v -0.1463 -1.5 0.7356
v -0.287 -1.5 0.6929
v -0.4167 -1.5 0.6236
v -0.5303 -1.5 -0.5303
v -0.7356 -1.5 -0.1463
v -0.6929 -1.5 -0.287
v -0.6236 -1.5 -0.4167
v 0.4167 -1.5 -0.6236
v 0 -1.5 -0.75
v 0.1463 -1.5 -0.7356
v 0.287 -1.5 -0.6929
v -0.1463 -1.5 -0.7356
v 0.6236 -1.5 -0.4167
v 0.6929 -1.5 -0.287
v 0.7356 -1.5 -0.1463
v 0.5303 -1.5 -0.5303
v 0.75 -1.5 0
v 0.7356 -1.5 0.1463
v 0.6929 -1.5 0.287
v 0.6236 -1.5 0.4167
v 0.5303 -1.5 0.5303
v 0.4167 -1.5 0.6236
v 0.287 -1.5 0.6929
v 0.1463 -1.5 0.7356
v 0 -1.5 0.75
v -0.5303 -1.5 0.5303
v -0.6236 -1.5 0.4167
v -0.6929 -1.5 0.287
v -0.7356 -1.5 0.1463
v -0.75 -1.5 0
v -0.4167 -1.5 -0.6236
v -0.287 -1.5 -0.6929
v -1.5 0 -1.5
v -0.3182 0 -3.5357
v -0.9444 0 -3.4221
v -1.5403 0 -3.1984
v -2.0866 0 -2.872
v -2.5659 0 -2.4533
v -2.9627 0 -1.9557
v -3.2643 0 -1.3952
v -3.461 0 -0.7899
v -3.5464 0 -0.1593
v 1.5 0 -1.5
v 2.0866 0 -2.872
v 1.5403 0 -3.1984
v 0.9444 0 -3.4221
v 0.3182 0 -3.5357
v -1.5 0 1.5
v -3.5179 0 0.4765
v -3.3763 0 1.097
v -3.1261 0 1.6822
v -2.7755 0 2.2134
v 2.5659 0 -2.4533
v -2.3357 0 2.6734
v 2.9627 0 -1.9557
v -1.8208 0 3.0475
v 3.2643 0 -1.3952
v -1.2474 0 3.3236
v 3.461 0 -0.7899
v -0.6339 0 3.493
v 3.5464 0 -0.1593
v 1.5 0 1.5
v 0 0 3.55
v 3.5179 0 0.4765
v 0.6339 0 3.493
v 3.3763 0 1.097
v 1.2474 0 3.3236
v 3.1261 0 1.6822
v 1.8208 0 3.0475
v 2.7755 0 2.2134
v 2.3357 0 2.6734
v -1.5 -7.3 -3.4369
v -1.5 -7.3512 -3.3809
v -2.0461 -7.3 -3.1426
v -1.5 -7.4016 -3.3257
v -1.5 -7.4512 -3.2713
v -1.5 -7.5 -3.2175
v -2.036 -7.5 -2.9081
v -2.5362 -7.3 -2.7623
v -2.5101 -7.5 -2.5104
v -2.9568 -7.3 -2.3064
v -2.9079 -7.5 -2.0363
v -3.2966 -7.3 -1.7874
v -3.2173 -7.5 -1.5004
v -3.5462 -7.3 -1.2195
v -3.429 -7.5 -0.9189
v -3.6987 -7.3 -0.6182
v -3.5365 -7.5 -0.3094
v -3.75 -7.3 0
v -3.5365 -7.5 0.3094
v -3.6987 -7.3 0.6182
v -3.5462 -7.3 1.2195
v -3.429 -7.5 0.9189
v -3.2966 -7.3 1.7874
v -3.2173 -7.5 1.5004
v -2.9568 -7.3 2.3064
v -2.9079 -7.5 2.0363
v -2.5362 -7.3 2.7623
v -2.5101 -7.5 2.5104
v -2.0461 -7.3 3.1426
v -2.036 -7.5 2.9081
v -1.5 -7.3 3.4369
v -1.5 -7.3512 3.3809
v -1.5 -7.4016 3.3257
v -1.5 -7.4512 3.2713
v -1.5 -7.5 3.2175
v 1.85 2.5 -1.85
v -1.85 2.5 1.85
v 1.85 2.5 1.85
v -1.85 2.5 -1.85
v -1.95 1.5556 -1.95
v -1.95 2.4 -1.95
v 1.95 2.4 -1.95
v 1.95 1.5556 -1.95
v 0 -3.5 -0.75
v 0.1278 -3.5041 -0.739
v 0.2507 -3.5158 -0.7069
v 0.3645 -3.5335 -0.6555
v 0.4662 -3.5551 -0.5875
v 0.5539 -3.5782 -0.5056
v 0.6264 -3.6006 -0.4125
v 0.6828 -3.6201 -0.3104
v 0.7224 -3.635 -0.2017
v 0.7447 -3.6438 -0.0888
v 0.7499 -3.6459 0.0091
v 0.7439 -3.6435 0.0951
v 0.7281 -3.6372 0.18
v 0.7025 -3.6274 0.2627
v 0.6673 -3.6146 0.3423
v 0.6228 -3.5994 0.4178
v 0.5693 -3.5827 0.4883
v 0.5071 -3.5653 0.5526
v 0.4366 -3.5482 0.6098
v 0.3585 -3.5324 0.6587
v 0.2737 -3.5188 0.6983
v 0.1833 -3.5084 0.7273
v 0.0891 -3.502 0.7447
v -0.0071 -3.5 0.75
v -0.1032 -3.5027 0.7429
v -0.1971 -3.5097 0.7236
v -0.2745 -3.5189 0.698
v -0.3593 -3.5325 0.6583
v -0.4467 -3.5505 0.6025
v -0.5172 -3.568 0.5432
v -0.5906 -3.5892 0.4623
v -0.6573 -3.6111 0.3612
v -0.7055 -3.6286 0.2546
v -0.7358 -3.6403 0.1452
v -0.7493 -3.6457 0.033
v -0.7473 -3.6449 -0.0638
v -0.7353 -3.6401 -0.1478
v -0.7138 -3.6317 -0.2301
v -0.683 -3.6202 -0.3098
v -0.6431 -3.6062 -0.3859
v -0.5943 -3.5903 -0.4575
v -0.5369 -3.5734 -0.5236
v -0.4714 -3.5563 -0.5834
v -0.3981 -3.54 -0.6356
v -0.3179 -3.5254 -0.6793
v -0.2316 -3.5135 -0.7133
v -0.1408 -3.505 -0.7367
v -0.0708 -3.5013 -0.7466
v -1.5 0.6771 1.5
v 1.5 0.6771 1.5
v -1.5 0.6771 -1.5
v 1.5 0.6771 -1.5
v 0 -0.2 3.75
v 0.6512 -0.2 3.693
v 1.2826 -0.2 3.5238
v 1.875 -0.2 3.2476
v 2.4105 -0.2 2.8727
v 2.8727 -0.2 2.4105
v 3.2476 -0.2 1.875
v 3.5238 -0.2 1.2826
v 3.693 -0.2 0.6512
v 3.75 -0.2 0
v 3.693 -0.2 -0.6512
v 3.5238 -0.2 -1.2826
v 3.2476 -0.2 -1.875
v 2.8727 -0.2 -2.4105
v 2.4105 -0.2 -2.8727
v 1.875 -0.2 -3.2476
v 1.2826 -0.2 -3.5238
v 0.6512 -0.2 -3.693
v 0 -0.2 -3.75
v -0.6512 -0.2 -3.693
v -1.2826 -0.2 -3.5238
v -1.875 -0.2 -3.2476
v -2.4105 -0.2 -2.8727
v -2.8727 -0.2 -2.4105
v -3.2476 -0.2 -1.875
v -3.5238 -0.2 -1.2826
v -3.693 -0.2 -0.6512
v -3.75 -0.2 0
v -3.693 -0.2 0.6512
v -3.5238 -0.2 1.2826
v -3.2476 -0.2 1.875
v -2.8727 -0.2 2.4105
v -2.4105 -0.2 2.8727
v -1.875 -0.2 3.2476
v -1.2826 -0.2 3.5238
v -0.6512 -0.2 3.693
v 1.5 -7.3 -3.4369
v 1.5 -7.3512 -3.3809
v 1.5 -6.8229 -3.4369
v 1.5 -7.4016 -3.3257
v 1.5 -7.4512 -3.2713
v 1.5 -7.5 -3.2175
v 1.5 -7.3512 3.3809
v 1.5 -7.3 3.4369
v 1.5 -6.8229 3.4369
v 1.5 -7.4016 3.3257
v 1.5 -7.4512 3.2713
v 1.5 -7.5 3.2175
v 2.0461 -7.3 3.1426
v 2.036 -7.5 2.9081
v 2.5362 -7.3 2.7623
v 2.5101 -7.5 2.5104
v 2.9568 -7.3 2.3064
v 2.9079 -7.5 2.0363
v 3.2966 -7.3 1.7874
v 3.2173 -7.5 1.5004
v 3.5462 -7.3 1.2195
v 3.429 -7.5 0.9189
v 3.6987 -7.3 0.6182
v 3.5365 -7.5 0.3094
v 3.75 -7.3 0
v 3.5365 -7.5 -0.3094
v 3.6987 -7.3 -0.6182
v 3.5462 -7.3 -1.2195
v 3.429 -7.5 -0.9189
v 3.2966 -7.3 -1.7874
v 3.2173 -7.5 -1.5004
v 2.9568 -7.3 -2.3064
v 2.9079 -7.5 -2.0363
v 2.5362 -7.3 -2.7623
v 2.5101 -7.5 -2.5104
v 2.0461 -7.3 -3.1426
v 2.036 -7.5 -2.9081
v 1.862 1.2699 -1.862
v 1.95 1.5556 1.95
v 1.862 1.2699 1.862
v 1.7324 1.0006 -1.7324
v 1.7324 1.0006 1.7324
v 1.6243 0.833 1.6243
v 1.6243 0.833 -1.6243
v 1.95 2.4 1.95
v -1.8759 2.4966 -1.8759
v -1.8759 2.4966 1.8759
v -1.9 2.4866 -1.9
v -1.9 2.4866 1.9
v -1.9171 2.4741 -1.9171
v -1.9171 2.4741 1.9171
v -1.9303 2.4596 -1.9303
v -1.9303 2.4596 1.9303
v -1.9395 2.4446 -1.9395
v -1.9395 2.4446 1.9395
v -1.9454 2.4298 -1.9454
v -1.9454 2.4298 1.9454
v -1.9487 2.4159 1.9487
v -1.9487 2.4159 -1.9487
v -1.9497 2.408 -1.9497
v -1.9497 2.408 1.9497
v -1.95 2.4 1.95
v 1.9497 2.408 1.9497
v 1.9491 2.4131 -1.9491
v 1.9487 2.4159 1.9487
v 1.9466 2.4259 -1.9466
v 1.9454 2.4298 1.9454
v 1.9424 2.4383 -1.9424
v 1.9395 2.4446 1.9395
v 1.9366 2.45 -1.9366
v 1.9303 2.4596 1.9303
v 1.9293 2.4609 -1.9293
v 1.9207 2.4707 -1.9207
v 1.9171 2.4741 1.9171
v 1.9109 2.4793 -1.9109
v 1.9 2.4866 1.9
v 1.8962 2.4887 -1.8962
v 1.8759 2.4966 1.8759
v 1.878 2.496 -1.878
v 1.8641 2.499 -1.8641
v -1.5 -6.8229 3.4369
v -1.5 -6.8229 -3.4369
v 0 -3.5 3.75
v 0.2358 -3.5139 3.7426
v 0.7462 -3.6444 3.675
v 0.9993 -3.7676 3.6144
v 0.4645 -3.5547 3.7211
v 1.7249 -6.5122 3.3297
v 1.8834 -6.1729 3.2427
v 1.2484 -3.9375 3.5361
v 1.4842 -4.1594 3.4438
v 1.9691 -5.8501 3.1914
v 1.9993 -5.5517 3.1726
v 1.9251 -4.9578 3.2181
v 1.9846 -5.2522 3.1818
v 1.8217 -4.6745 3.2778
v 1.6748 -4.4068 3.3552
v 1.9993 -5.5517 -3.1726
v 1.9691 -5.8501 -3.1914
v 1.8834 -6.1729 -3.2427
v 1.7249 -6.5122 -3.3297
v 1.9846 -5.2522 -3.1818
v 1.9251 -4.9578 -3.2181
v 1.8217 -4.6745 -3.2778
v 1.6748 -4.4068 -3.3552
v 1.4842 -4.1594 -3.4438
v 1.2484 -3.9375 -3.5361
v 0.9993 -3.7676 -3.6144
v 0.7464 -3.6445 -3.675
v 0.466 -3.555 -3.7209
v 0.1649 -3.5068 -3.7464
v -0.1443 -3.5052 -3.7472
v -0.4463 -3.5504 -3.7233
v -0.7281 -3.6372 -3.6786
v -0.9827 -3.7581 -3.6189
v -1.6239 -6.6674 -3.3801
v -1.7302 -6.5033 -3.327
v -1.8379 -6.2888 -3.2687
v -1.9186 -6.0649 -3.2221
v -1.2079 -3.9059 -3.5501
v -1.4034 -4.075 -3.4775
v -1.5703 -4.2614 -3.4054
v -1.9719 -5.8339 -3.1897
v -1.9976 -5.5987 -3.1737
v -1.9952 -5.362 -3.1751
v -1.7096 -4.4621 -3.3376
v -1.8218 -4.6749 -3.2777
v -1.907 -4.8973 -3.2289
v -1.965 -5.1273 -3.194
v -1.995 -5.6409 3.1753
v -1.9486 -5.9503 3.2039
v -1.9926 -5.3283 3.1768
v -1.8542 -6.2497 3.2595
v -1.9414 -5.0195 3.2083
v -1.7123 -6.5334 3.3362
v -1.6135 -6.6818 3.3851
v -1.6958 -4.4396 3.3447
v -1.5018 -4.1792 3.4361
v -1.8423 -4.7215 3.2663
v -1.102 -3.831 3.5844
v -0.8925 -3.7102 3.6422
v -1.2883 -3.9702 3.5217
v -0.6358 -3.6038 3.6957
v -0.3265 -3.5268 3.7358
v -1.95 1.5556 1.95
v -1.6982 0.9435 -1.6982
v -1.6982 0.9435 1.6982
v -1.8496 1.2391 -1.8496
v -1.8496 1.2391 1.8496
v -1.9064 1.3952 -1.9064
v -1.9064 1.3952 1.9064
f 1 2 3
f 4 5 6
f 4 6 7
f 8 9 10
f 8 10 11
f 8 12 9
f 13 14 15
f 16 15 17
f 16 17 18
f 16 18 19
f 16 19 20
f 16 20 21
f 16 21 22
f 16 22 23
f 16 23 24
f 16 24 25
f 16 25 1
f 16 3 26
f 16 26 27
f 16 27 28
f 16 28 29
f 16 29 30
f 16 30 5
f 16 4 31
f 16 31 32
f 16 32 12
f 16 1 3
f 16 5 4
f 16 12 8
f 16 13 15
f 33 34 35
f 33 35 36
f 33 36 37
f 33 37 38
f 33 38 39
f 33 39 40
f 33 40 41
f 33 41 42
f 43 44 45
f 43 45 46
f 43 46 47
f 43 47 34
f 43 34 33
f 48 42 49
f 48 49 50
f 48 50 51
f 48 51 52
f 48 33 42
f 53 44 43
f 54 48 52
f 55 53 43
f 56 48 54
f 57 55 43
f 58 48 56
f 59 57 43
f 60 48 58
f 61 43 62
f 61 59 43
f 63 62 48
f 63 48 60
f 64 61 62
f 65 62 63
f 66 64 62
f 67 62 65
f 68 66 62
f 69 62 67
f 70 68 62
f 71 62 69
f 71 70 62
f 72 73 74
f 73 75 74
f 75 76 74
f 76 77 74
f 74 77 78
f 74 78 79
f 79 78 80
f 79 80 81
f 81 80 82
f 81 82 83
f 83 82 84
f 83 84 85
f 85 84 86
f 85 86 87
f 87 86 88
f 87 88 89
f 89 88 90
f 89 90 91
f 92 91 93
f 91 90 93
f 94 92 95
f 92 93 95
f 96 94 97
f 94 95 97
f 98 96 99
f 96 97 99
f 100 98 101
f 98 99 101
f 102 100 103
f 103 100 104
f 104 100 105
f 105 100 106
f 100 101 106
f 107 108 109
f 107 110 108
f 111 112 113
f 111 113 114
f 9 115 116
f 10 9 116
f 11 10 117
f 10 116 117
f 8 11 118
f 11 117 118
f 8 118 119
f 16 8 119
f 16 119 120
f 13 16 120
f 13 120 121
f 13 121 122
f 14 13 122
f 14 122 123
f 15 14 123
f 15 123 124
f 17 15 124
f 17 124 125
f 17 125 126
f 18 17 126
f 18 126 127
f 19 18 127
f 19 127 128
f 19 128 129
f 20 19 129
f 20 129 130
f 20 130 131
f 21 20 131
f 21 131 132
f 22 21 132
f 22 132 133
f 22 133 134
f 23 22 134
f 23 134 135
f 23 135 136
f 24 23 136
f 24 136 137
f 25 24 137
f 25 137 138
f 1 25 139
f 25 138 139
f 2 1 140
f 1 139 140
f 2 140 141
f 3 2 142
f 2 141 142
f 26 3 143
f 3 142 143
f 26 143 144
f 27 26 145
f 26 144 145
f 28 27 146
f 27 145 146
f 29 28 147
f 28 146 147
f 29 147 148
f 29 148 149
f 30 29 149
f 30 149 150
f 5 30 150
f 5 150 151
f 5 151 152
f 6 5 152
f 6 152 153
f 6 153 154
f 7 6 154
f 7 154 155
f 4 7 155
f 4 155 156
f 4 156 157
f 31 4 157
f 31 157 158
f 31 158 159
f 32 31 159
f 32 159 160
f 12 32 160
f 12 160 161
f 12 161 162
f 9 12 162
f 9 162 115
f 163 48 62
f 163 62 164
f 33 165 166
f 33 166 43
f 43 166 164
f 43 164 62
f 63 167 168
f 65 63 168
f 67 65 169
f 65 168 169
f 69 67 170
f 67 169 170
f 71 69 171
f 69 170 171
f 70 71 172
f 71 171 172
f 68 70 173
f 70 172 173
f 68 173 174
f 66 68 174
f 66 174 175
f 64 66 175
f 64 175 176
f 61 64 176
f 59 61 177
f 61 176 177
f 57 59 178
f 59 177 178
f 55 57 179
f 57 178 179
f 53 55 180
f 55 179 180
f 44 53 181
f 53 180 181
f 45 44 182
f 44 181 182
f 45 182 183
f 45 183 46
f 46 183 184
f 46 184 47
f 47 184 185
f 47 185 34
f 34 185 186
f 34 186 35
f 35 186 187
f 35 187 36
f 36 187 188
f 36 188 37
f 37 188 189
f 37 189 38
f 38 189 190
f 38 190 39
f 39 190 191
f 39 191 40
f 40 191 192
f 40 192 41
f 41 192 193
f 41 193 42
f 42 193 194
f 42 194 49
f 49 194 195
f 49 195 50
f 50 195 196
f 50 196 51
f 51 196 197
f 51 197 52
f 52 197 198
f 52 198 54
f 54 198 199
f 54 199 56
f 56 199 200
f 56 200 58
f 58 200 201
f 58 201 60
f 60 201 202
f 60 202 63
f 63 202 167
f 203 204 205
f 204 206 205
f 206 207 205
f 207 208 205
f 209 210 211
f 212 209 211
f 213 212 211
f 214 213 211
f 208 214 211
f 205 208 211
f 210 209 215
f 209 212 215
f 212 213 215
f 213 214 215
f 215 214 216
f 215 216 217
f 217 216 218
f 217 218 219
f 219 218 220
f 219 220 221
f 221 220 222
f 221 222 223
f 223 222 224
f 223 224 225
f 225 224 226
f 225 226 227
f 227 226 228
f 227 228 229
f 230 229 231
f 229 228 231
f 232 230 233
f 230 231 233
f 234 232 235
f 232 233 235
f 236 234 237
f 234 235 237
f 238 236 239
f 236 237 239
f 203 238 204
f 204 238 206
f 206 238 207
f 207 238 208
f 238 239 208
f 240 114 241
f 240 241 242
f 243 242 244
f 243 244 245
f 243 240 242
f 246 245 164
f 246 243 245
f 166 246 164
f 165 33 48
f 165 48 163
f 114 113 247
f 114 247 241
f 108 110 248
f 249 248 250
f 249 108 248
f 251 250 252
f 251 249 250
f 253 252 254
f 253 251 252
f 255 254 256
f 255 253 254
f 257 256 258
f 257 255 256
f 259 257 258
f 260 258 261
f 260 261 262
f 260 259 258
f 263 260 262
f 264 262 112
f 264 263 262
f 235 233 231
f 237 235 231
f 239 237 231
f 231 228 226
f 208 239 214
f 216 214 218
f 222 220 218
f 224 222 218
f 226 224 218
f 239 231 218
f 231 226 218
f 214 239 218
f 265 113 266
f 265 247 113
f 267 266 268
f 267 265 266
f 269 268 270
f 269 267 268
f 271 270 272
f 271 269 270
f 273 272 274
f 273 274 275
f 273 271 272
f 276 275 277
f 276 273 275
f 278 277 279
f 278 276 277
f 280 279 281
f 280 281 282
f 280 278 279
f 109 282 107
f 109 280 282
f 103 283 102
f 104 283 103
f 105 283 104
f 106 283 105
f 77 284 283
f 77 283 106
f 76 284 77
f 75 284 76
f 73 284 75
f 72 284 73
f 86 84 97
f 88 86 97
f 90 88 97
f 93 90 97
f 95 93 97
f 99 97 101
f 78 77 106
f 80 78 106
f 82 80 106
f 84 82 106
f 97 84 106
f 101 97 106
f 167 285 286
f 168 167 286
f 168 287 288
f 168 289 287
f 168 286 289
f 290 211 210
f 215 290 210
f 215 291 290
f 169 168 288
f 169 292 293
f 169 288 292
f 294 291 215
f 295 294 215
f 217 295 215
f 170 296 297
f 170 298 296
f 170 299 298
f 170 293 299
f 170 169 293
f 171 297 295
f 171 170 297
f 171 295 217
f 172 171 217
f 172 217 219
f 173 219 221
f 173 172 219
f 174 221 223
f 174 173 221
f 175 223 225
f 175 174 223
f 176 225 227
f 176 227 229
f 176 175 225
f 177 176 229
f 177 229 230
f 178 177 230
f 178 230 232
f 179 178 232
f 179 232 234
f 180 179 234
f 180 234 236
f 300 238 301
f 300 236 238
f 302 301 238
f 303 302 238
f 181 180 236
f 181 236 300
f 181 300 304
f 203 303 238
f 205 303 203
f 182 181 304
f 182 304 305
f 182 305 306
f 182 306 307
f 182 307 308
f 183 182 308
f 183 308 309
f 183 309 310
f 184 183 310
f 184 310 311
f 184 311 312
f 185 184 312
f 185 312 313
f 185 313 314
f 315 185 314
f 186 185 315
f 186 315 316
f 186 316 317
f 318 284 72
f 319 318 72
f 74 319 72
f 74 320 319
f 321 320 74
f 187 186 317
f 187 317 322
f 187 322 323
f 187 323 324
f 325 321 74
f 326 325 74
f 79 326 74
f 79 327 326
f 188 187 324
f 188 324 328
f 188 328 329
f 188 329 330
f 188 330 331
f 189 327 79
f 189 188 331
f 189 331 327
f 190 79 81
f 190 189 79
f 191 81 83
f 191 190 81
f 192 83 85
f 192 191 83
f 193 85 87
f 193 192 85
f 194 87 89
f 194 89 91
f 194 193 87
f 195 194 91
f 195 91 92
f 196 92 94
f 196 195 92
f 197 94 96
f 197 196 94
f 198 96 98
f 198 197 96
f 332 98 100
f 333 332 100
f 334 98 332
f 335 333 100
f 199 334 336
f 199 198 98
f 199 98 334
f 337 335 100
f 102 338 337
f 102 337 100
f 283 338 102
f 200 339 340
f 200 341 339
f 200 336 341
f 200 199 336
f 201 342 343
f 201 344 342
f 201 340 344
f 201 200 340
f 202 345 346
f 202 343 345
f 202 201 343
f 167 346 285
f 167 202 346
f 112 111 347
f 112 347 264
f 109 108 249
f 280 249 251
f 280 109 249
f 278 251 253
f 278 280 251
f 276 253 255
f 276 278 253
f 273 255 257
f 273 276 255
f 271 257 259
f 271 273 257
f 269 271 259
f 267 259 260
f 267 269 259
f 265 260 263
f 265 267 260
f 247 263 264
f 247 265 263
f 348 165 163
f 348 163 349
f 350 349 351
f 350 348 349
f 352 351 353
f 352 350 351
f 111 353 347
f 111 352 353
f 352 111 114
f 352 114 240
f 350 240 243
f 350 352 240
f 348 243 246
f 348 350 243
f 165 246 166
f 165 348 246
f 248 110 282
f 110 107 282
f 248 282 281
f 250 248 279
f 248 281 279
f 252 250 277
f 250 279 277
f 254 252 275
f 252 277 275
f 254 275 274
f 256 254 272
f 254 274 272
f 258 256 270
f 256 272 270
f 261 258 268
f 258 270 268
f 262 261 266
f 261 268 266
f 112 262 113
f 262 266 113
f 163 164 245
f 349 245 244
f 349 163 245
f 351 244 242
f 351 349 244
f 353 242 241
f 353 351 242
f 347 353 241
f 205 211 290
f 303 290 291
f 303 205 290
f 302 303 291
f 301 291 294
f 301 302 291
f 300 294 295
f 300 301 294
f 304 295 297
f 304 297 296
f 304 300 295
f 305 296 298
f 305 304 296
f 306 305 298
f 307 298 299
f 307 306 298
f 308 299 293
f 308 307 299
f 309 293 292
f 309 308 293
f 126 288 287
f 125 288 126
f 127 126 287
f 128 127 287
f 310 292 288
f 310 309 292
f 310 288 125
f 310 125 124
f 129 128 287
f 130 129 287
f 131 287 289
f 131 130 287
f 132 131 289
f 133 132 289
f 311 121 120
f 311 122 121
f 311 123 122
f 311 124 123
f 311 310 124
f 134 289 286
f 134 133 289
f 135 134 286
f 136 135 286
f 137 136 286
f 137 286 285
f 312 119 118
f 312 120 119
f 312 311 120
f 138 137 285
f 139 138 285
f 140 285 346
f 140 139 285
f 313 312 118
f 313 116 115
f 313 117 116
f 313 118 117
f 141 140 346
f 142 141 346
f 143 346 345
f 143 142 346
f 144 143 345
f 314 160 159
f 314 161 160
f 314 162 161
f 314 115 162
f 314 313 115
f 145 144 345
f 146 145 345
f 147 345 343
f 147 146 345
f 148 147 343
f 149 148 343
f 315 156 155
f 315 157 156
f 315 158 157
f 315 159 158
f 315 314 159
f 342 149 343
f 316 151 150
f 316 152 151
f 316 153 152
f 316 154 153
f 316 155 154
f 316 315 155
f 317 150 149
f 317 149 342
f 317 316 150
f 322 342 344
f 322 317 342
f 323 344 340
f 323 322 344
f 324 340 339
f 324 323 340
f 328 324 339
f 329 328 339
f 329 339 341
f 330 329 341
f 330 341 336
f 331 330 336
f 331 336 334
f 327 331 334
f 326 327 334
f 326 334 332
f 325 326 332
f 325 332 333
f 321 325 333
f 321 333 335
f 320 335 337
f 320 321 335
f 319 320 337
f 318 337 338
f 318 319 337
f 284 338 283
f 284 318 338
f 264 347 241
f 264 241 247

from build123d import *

# Parameters (mm, degrees)
SKETCH_1_R                           = 3.75
EXTRUDE_1_DEPTH                      = 7.5
EXTRUDE_2_DEPTH                      = 2
EXTRUDE_2_DEPTH_BACK                 = 2
CUT_EXTRUDE_1_DEPTH                  = 2
CUT_EXTRUDE_1_DEPTH_BACK             = 2
CUT_EXTRUDE_2_REACH                  = 11.186
CUT_EXTRUDE_2_END_RADIUS             = 3.75
CUT_EXTRUDE_2_DIRECTION_2_REACH      = 11.186
CUT_EXTRUDE_2_DIRECTION_2_END_RADIUS = 3.75
FILLET_1_R                           = 0.1
SKETCH_5_R                           = 0.75
CUT_EXTRUDE_3_DEPTH                  = 6
CHAMFER_1_SIZE                       = 0.2


with BuildPart() as part:
    # 草图1 → 凸台-拉伸1 (new body)
    with BuildSketch(Plane(origin=(0, 0, 0), x_dir=(1, 0, 0), z_dir=(0, 1, 0))):
        with Locations(Location((0, 0, 0), (0, 0, 270))):
            Circle(SKETCH_1_R)
    extrude(amount=-EXTRUDE_1_DEPTH)

    # 草图2 → 凸台-拉伸2 (add, two sides: drawn at the far end of the back side and taken through both)
    with BuildSketch(Plane.XY.offset(-EXTRUDE_2_DEPTH_BACK)):
        with BuildLine():
            Line((-1.95, 2.5), (1.95, 2.5))
            Line((1.95, 2.5), (1.95, 1.555590279))
            ThreePointArc((1.95, 1.555590279), (1.780042303, 1.088161527), (1.5, 0.677124344))
            Line((1.5, 0.677124344), (1.5, 0))
            Line((1.5, 0), (-1.5, 0))
            Line((-1.5, 0), (-1.5, 0.677124344))
            ThreePointArc((-1.5, 0.677124344), (-1.780042303, 1.088161527), (-1.95, 1.555590279))
            Line((-1.95, 1.555590279), (-1.95, 2.5))
        make_face()
    extrude(amount=EXTRUDE_2_DEPTH + EXTRUDE_2_DEPTH_BACK)

    # 草图3 → 切除-拉伸1 (cut, two sides: drawn at the far end of the back side and taken through both)
    with BuildSketch(Plane(origin=(0, 0, 0), x_dir=(0, 0, -1), z_dir=(1, 0, 0)).offset(-CUT_EXTRUDE_1_DEPTH_BACK)):
        with BuildLine():
            Line((1.95, 2.5), (1.95, 1.555590279))
            ThreePointArc((1.95, 1.555590279), (1.780042303, 1.088161527), (1.5, 0.677124344))
            Line((1.5, 0.677124344), (1.5, 0))
            Line((1.5, 0), (2, 0))
            Line((2, 0), (2, 2.5))
            Line((2, 2.5), (1.95, 2.5))
        make_face()
        with BuildLine():
            Line((-2, 0), (-1.5, 0))
            Line((-1.5, 0), (-1.5, 0.677124344))
            ThreePointArc((-1.5, 0.677124344), (-1.780042303, 1.088161527), (-1.95, 1.555590279))
            Line((-1.95, 1.555590279), (-1.95, 2.5))
            Line((-1.95, 2.5), (-2, 2.5))
            Line((-2, 2.5), (-2, 0))
        make_face()
    extrude(amount=CUT_EXTRUDE_1_DEPTH + CUT_EXTRUDE_1_DEPTH_BACK, mode=Mode.SUBTRACT)

    # 切除-拉伸2: up to this cylinder (the profile starts inside it)
    cut_extrude_2_end = Plane(origin=(0, -5.585293, 0), z_dir=(0, 1, 0)) * Cylinder(CUT_EXTRUDE_2_END_RADIUS, 30.872, mode=Mode.PRIVATE)
    # 草图4 → 切除-拉伸2 (cut, up to the surface)
    with BuildSketch(Plane.XY, mode=Mode.PRIVATE) as cut_extrude_2_sk1:
        with BuildLine():
            Line((-1.5, -7.5), (1.5, -7.5))
            Line((1.5, -7.5), (1.5, -6.822875656))
            ThreePointArc((1.5, -6.822875656), (0, -3.5), (-1.5, -6.822875656))
            Line((-1.5, -6.822875656), (-1.5, -7.5))
        make_face()
    cut_extrude_2_tool1 = extrude(cut_extrude_2_sk1.sketch, amount=-CUT_EXTRUDE_2_REACH, mode=Mode.PRIVATE) & cut_extrude_2_end
    add(cut_extrude_2_tool1.solids().sort_by_distance((0, -5.585293, 0))[0], mode=Mode.SUBTRACT)

    # 切除-拉伸2 direction 2: up to this cylinder (the profile starts inside it)
    cut_extrude_2_direction_2_end = Plane(origin=(0, -5.585293, 0), z_dir=(0, 1, 0)) * Cylinder(CUT_EXTRUDE_2_DIRECTION_2_END_RADIUS, 30.872, mode=Mode.PRIVATE)
    # 草图4 → 切除-拉伸2 direction 2 (cut, up to the surface)
    with BuildSketch(Plane.XY, mode=Mode.PRIVATE) as cut_extrude_2_direction_2_sk1:
        with BuildLine():
            Line((-1.5, -7.5), (1.5, -7.5))
            Line((1.5, -7.5), (1.5, -6.822875656))
            ThreePointArc((1.5, -6.822875656), (0, -3.5), (-1.5, -6.822875656))
            Line((-1.5, -6.822875656), (-1.5, -7.5))
        make_face()
    cut_extrude_2_direction_2_tool1 = extrude(cut_extrude_2_direction_2_sk1.sketch, amount=CUT_EXTRUDE_2_DIRECTION_2_REACH, mode=Mode.PRIVATE) & cut_extrude_2_direction_2_end
    add(cut_extrude_2_direction_2_tool1.solids().sort_by_distance((0, -5.585293, 0))[0], mode=Mode.SUBTRACT)

    # 圆角1
    fillet_1_edges = [part.edges().sort_by_distance(p)[0] for p in [
        (0, 2.5, 1.95),
        (1.95, 2.5, 0),
        (-1.95, 2.5, 0),
        (0, 2.5, -1.95),
    ]]
    fillet(fillet_1_edges, radius=FILLET_1_R)

    # 草图5 → 切除-拉伸3 (cut)
    with BuildSketch(Plane.XZ.offset(7.5)):
        with Locations(Location((0, 0, 0), (0, 0, 270))):
            Circle(SKETCH_5_R)
    extrude(amount=-CUT_EXTRUDE_3_DEPTH, mode=Mode.SUBTRACT)

    # 倒角1
    chamfer_1_edges = [part.edges().sort_by_distance(p)[0] for p in [
        (0, 0, -3.75),
        (3.75, -7.5, 0),
        (-3.75, -7.5, 0),
    ]]
    chamfer(chamfer_1_edges, length=CHAMFER_1_SIZE)


solid = part.part
